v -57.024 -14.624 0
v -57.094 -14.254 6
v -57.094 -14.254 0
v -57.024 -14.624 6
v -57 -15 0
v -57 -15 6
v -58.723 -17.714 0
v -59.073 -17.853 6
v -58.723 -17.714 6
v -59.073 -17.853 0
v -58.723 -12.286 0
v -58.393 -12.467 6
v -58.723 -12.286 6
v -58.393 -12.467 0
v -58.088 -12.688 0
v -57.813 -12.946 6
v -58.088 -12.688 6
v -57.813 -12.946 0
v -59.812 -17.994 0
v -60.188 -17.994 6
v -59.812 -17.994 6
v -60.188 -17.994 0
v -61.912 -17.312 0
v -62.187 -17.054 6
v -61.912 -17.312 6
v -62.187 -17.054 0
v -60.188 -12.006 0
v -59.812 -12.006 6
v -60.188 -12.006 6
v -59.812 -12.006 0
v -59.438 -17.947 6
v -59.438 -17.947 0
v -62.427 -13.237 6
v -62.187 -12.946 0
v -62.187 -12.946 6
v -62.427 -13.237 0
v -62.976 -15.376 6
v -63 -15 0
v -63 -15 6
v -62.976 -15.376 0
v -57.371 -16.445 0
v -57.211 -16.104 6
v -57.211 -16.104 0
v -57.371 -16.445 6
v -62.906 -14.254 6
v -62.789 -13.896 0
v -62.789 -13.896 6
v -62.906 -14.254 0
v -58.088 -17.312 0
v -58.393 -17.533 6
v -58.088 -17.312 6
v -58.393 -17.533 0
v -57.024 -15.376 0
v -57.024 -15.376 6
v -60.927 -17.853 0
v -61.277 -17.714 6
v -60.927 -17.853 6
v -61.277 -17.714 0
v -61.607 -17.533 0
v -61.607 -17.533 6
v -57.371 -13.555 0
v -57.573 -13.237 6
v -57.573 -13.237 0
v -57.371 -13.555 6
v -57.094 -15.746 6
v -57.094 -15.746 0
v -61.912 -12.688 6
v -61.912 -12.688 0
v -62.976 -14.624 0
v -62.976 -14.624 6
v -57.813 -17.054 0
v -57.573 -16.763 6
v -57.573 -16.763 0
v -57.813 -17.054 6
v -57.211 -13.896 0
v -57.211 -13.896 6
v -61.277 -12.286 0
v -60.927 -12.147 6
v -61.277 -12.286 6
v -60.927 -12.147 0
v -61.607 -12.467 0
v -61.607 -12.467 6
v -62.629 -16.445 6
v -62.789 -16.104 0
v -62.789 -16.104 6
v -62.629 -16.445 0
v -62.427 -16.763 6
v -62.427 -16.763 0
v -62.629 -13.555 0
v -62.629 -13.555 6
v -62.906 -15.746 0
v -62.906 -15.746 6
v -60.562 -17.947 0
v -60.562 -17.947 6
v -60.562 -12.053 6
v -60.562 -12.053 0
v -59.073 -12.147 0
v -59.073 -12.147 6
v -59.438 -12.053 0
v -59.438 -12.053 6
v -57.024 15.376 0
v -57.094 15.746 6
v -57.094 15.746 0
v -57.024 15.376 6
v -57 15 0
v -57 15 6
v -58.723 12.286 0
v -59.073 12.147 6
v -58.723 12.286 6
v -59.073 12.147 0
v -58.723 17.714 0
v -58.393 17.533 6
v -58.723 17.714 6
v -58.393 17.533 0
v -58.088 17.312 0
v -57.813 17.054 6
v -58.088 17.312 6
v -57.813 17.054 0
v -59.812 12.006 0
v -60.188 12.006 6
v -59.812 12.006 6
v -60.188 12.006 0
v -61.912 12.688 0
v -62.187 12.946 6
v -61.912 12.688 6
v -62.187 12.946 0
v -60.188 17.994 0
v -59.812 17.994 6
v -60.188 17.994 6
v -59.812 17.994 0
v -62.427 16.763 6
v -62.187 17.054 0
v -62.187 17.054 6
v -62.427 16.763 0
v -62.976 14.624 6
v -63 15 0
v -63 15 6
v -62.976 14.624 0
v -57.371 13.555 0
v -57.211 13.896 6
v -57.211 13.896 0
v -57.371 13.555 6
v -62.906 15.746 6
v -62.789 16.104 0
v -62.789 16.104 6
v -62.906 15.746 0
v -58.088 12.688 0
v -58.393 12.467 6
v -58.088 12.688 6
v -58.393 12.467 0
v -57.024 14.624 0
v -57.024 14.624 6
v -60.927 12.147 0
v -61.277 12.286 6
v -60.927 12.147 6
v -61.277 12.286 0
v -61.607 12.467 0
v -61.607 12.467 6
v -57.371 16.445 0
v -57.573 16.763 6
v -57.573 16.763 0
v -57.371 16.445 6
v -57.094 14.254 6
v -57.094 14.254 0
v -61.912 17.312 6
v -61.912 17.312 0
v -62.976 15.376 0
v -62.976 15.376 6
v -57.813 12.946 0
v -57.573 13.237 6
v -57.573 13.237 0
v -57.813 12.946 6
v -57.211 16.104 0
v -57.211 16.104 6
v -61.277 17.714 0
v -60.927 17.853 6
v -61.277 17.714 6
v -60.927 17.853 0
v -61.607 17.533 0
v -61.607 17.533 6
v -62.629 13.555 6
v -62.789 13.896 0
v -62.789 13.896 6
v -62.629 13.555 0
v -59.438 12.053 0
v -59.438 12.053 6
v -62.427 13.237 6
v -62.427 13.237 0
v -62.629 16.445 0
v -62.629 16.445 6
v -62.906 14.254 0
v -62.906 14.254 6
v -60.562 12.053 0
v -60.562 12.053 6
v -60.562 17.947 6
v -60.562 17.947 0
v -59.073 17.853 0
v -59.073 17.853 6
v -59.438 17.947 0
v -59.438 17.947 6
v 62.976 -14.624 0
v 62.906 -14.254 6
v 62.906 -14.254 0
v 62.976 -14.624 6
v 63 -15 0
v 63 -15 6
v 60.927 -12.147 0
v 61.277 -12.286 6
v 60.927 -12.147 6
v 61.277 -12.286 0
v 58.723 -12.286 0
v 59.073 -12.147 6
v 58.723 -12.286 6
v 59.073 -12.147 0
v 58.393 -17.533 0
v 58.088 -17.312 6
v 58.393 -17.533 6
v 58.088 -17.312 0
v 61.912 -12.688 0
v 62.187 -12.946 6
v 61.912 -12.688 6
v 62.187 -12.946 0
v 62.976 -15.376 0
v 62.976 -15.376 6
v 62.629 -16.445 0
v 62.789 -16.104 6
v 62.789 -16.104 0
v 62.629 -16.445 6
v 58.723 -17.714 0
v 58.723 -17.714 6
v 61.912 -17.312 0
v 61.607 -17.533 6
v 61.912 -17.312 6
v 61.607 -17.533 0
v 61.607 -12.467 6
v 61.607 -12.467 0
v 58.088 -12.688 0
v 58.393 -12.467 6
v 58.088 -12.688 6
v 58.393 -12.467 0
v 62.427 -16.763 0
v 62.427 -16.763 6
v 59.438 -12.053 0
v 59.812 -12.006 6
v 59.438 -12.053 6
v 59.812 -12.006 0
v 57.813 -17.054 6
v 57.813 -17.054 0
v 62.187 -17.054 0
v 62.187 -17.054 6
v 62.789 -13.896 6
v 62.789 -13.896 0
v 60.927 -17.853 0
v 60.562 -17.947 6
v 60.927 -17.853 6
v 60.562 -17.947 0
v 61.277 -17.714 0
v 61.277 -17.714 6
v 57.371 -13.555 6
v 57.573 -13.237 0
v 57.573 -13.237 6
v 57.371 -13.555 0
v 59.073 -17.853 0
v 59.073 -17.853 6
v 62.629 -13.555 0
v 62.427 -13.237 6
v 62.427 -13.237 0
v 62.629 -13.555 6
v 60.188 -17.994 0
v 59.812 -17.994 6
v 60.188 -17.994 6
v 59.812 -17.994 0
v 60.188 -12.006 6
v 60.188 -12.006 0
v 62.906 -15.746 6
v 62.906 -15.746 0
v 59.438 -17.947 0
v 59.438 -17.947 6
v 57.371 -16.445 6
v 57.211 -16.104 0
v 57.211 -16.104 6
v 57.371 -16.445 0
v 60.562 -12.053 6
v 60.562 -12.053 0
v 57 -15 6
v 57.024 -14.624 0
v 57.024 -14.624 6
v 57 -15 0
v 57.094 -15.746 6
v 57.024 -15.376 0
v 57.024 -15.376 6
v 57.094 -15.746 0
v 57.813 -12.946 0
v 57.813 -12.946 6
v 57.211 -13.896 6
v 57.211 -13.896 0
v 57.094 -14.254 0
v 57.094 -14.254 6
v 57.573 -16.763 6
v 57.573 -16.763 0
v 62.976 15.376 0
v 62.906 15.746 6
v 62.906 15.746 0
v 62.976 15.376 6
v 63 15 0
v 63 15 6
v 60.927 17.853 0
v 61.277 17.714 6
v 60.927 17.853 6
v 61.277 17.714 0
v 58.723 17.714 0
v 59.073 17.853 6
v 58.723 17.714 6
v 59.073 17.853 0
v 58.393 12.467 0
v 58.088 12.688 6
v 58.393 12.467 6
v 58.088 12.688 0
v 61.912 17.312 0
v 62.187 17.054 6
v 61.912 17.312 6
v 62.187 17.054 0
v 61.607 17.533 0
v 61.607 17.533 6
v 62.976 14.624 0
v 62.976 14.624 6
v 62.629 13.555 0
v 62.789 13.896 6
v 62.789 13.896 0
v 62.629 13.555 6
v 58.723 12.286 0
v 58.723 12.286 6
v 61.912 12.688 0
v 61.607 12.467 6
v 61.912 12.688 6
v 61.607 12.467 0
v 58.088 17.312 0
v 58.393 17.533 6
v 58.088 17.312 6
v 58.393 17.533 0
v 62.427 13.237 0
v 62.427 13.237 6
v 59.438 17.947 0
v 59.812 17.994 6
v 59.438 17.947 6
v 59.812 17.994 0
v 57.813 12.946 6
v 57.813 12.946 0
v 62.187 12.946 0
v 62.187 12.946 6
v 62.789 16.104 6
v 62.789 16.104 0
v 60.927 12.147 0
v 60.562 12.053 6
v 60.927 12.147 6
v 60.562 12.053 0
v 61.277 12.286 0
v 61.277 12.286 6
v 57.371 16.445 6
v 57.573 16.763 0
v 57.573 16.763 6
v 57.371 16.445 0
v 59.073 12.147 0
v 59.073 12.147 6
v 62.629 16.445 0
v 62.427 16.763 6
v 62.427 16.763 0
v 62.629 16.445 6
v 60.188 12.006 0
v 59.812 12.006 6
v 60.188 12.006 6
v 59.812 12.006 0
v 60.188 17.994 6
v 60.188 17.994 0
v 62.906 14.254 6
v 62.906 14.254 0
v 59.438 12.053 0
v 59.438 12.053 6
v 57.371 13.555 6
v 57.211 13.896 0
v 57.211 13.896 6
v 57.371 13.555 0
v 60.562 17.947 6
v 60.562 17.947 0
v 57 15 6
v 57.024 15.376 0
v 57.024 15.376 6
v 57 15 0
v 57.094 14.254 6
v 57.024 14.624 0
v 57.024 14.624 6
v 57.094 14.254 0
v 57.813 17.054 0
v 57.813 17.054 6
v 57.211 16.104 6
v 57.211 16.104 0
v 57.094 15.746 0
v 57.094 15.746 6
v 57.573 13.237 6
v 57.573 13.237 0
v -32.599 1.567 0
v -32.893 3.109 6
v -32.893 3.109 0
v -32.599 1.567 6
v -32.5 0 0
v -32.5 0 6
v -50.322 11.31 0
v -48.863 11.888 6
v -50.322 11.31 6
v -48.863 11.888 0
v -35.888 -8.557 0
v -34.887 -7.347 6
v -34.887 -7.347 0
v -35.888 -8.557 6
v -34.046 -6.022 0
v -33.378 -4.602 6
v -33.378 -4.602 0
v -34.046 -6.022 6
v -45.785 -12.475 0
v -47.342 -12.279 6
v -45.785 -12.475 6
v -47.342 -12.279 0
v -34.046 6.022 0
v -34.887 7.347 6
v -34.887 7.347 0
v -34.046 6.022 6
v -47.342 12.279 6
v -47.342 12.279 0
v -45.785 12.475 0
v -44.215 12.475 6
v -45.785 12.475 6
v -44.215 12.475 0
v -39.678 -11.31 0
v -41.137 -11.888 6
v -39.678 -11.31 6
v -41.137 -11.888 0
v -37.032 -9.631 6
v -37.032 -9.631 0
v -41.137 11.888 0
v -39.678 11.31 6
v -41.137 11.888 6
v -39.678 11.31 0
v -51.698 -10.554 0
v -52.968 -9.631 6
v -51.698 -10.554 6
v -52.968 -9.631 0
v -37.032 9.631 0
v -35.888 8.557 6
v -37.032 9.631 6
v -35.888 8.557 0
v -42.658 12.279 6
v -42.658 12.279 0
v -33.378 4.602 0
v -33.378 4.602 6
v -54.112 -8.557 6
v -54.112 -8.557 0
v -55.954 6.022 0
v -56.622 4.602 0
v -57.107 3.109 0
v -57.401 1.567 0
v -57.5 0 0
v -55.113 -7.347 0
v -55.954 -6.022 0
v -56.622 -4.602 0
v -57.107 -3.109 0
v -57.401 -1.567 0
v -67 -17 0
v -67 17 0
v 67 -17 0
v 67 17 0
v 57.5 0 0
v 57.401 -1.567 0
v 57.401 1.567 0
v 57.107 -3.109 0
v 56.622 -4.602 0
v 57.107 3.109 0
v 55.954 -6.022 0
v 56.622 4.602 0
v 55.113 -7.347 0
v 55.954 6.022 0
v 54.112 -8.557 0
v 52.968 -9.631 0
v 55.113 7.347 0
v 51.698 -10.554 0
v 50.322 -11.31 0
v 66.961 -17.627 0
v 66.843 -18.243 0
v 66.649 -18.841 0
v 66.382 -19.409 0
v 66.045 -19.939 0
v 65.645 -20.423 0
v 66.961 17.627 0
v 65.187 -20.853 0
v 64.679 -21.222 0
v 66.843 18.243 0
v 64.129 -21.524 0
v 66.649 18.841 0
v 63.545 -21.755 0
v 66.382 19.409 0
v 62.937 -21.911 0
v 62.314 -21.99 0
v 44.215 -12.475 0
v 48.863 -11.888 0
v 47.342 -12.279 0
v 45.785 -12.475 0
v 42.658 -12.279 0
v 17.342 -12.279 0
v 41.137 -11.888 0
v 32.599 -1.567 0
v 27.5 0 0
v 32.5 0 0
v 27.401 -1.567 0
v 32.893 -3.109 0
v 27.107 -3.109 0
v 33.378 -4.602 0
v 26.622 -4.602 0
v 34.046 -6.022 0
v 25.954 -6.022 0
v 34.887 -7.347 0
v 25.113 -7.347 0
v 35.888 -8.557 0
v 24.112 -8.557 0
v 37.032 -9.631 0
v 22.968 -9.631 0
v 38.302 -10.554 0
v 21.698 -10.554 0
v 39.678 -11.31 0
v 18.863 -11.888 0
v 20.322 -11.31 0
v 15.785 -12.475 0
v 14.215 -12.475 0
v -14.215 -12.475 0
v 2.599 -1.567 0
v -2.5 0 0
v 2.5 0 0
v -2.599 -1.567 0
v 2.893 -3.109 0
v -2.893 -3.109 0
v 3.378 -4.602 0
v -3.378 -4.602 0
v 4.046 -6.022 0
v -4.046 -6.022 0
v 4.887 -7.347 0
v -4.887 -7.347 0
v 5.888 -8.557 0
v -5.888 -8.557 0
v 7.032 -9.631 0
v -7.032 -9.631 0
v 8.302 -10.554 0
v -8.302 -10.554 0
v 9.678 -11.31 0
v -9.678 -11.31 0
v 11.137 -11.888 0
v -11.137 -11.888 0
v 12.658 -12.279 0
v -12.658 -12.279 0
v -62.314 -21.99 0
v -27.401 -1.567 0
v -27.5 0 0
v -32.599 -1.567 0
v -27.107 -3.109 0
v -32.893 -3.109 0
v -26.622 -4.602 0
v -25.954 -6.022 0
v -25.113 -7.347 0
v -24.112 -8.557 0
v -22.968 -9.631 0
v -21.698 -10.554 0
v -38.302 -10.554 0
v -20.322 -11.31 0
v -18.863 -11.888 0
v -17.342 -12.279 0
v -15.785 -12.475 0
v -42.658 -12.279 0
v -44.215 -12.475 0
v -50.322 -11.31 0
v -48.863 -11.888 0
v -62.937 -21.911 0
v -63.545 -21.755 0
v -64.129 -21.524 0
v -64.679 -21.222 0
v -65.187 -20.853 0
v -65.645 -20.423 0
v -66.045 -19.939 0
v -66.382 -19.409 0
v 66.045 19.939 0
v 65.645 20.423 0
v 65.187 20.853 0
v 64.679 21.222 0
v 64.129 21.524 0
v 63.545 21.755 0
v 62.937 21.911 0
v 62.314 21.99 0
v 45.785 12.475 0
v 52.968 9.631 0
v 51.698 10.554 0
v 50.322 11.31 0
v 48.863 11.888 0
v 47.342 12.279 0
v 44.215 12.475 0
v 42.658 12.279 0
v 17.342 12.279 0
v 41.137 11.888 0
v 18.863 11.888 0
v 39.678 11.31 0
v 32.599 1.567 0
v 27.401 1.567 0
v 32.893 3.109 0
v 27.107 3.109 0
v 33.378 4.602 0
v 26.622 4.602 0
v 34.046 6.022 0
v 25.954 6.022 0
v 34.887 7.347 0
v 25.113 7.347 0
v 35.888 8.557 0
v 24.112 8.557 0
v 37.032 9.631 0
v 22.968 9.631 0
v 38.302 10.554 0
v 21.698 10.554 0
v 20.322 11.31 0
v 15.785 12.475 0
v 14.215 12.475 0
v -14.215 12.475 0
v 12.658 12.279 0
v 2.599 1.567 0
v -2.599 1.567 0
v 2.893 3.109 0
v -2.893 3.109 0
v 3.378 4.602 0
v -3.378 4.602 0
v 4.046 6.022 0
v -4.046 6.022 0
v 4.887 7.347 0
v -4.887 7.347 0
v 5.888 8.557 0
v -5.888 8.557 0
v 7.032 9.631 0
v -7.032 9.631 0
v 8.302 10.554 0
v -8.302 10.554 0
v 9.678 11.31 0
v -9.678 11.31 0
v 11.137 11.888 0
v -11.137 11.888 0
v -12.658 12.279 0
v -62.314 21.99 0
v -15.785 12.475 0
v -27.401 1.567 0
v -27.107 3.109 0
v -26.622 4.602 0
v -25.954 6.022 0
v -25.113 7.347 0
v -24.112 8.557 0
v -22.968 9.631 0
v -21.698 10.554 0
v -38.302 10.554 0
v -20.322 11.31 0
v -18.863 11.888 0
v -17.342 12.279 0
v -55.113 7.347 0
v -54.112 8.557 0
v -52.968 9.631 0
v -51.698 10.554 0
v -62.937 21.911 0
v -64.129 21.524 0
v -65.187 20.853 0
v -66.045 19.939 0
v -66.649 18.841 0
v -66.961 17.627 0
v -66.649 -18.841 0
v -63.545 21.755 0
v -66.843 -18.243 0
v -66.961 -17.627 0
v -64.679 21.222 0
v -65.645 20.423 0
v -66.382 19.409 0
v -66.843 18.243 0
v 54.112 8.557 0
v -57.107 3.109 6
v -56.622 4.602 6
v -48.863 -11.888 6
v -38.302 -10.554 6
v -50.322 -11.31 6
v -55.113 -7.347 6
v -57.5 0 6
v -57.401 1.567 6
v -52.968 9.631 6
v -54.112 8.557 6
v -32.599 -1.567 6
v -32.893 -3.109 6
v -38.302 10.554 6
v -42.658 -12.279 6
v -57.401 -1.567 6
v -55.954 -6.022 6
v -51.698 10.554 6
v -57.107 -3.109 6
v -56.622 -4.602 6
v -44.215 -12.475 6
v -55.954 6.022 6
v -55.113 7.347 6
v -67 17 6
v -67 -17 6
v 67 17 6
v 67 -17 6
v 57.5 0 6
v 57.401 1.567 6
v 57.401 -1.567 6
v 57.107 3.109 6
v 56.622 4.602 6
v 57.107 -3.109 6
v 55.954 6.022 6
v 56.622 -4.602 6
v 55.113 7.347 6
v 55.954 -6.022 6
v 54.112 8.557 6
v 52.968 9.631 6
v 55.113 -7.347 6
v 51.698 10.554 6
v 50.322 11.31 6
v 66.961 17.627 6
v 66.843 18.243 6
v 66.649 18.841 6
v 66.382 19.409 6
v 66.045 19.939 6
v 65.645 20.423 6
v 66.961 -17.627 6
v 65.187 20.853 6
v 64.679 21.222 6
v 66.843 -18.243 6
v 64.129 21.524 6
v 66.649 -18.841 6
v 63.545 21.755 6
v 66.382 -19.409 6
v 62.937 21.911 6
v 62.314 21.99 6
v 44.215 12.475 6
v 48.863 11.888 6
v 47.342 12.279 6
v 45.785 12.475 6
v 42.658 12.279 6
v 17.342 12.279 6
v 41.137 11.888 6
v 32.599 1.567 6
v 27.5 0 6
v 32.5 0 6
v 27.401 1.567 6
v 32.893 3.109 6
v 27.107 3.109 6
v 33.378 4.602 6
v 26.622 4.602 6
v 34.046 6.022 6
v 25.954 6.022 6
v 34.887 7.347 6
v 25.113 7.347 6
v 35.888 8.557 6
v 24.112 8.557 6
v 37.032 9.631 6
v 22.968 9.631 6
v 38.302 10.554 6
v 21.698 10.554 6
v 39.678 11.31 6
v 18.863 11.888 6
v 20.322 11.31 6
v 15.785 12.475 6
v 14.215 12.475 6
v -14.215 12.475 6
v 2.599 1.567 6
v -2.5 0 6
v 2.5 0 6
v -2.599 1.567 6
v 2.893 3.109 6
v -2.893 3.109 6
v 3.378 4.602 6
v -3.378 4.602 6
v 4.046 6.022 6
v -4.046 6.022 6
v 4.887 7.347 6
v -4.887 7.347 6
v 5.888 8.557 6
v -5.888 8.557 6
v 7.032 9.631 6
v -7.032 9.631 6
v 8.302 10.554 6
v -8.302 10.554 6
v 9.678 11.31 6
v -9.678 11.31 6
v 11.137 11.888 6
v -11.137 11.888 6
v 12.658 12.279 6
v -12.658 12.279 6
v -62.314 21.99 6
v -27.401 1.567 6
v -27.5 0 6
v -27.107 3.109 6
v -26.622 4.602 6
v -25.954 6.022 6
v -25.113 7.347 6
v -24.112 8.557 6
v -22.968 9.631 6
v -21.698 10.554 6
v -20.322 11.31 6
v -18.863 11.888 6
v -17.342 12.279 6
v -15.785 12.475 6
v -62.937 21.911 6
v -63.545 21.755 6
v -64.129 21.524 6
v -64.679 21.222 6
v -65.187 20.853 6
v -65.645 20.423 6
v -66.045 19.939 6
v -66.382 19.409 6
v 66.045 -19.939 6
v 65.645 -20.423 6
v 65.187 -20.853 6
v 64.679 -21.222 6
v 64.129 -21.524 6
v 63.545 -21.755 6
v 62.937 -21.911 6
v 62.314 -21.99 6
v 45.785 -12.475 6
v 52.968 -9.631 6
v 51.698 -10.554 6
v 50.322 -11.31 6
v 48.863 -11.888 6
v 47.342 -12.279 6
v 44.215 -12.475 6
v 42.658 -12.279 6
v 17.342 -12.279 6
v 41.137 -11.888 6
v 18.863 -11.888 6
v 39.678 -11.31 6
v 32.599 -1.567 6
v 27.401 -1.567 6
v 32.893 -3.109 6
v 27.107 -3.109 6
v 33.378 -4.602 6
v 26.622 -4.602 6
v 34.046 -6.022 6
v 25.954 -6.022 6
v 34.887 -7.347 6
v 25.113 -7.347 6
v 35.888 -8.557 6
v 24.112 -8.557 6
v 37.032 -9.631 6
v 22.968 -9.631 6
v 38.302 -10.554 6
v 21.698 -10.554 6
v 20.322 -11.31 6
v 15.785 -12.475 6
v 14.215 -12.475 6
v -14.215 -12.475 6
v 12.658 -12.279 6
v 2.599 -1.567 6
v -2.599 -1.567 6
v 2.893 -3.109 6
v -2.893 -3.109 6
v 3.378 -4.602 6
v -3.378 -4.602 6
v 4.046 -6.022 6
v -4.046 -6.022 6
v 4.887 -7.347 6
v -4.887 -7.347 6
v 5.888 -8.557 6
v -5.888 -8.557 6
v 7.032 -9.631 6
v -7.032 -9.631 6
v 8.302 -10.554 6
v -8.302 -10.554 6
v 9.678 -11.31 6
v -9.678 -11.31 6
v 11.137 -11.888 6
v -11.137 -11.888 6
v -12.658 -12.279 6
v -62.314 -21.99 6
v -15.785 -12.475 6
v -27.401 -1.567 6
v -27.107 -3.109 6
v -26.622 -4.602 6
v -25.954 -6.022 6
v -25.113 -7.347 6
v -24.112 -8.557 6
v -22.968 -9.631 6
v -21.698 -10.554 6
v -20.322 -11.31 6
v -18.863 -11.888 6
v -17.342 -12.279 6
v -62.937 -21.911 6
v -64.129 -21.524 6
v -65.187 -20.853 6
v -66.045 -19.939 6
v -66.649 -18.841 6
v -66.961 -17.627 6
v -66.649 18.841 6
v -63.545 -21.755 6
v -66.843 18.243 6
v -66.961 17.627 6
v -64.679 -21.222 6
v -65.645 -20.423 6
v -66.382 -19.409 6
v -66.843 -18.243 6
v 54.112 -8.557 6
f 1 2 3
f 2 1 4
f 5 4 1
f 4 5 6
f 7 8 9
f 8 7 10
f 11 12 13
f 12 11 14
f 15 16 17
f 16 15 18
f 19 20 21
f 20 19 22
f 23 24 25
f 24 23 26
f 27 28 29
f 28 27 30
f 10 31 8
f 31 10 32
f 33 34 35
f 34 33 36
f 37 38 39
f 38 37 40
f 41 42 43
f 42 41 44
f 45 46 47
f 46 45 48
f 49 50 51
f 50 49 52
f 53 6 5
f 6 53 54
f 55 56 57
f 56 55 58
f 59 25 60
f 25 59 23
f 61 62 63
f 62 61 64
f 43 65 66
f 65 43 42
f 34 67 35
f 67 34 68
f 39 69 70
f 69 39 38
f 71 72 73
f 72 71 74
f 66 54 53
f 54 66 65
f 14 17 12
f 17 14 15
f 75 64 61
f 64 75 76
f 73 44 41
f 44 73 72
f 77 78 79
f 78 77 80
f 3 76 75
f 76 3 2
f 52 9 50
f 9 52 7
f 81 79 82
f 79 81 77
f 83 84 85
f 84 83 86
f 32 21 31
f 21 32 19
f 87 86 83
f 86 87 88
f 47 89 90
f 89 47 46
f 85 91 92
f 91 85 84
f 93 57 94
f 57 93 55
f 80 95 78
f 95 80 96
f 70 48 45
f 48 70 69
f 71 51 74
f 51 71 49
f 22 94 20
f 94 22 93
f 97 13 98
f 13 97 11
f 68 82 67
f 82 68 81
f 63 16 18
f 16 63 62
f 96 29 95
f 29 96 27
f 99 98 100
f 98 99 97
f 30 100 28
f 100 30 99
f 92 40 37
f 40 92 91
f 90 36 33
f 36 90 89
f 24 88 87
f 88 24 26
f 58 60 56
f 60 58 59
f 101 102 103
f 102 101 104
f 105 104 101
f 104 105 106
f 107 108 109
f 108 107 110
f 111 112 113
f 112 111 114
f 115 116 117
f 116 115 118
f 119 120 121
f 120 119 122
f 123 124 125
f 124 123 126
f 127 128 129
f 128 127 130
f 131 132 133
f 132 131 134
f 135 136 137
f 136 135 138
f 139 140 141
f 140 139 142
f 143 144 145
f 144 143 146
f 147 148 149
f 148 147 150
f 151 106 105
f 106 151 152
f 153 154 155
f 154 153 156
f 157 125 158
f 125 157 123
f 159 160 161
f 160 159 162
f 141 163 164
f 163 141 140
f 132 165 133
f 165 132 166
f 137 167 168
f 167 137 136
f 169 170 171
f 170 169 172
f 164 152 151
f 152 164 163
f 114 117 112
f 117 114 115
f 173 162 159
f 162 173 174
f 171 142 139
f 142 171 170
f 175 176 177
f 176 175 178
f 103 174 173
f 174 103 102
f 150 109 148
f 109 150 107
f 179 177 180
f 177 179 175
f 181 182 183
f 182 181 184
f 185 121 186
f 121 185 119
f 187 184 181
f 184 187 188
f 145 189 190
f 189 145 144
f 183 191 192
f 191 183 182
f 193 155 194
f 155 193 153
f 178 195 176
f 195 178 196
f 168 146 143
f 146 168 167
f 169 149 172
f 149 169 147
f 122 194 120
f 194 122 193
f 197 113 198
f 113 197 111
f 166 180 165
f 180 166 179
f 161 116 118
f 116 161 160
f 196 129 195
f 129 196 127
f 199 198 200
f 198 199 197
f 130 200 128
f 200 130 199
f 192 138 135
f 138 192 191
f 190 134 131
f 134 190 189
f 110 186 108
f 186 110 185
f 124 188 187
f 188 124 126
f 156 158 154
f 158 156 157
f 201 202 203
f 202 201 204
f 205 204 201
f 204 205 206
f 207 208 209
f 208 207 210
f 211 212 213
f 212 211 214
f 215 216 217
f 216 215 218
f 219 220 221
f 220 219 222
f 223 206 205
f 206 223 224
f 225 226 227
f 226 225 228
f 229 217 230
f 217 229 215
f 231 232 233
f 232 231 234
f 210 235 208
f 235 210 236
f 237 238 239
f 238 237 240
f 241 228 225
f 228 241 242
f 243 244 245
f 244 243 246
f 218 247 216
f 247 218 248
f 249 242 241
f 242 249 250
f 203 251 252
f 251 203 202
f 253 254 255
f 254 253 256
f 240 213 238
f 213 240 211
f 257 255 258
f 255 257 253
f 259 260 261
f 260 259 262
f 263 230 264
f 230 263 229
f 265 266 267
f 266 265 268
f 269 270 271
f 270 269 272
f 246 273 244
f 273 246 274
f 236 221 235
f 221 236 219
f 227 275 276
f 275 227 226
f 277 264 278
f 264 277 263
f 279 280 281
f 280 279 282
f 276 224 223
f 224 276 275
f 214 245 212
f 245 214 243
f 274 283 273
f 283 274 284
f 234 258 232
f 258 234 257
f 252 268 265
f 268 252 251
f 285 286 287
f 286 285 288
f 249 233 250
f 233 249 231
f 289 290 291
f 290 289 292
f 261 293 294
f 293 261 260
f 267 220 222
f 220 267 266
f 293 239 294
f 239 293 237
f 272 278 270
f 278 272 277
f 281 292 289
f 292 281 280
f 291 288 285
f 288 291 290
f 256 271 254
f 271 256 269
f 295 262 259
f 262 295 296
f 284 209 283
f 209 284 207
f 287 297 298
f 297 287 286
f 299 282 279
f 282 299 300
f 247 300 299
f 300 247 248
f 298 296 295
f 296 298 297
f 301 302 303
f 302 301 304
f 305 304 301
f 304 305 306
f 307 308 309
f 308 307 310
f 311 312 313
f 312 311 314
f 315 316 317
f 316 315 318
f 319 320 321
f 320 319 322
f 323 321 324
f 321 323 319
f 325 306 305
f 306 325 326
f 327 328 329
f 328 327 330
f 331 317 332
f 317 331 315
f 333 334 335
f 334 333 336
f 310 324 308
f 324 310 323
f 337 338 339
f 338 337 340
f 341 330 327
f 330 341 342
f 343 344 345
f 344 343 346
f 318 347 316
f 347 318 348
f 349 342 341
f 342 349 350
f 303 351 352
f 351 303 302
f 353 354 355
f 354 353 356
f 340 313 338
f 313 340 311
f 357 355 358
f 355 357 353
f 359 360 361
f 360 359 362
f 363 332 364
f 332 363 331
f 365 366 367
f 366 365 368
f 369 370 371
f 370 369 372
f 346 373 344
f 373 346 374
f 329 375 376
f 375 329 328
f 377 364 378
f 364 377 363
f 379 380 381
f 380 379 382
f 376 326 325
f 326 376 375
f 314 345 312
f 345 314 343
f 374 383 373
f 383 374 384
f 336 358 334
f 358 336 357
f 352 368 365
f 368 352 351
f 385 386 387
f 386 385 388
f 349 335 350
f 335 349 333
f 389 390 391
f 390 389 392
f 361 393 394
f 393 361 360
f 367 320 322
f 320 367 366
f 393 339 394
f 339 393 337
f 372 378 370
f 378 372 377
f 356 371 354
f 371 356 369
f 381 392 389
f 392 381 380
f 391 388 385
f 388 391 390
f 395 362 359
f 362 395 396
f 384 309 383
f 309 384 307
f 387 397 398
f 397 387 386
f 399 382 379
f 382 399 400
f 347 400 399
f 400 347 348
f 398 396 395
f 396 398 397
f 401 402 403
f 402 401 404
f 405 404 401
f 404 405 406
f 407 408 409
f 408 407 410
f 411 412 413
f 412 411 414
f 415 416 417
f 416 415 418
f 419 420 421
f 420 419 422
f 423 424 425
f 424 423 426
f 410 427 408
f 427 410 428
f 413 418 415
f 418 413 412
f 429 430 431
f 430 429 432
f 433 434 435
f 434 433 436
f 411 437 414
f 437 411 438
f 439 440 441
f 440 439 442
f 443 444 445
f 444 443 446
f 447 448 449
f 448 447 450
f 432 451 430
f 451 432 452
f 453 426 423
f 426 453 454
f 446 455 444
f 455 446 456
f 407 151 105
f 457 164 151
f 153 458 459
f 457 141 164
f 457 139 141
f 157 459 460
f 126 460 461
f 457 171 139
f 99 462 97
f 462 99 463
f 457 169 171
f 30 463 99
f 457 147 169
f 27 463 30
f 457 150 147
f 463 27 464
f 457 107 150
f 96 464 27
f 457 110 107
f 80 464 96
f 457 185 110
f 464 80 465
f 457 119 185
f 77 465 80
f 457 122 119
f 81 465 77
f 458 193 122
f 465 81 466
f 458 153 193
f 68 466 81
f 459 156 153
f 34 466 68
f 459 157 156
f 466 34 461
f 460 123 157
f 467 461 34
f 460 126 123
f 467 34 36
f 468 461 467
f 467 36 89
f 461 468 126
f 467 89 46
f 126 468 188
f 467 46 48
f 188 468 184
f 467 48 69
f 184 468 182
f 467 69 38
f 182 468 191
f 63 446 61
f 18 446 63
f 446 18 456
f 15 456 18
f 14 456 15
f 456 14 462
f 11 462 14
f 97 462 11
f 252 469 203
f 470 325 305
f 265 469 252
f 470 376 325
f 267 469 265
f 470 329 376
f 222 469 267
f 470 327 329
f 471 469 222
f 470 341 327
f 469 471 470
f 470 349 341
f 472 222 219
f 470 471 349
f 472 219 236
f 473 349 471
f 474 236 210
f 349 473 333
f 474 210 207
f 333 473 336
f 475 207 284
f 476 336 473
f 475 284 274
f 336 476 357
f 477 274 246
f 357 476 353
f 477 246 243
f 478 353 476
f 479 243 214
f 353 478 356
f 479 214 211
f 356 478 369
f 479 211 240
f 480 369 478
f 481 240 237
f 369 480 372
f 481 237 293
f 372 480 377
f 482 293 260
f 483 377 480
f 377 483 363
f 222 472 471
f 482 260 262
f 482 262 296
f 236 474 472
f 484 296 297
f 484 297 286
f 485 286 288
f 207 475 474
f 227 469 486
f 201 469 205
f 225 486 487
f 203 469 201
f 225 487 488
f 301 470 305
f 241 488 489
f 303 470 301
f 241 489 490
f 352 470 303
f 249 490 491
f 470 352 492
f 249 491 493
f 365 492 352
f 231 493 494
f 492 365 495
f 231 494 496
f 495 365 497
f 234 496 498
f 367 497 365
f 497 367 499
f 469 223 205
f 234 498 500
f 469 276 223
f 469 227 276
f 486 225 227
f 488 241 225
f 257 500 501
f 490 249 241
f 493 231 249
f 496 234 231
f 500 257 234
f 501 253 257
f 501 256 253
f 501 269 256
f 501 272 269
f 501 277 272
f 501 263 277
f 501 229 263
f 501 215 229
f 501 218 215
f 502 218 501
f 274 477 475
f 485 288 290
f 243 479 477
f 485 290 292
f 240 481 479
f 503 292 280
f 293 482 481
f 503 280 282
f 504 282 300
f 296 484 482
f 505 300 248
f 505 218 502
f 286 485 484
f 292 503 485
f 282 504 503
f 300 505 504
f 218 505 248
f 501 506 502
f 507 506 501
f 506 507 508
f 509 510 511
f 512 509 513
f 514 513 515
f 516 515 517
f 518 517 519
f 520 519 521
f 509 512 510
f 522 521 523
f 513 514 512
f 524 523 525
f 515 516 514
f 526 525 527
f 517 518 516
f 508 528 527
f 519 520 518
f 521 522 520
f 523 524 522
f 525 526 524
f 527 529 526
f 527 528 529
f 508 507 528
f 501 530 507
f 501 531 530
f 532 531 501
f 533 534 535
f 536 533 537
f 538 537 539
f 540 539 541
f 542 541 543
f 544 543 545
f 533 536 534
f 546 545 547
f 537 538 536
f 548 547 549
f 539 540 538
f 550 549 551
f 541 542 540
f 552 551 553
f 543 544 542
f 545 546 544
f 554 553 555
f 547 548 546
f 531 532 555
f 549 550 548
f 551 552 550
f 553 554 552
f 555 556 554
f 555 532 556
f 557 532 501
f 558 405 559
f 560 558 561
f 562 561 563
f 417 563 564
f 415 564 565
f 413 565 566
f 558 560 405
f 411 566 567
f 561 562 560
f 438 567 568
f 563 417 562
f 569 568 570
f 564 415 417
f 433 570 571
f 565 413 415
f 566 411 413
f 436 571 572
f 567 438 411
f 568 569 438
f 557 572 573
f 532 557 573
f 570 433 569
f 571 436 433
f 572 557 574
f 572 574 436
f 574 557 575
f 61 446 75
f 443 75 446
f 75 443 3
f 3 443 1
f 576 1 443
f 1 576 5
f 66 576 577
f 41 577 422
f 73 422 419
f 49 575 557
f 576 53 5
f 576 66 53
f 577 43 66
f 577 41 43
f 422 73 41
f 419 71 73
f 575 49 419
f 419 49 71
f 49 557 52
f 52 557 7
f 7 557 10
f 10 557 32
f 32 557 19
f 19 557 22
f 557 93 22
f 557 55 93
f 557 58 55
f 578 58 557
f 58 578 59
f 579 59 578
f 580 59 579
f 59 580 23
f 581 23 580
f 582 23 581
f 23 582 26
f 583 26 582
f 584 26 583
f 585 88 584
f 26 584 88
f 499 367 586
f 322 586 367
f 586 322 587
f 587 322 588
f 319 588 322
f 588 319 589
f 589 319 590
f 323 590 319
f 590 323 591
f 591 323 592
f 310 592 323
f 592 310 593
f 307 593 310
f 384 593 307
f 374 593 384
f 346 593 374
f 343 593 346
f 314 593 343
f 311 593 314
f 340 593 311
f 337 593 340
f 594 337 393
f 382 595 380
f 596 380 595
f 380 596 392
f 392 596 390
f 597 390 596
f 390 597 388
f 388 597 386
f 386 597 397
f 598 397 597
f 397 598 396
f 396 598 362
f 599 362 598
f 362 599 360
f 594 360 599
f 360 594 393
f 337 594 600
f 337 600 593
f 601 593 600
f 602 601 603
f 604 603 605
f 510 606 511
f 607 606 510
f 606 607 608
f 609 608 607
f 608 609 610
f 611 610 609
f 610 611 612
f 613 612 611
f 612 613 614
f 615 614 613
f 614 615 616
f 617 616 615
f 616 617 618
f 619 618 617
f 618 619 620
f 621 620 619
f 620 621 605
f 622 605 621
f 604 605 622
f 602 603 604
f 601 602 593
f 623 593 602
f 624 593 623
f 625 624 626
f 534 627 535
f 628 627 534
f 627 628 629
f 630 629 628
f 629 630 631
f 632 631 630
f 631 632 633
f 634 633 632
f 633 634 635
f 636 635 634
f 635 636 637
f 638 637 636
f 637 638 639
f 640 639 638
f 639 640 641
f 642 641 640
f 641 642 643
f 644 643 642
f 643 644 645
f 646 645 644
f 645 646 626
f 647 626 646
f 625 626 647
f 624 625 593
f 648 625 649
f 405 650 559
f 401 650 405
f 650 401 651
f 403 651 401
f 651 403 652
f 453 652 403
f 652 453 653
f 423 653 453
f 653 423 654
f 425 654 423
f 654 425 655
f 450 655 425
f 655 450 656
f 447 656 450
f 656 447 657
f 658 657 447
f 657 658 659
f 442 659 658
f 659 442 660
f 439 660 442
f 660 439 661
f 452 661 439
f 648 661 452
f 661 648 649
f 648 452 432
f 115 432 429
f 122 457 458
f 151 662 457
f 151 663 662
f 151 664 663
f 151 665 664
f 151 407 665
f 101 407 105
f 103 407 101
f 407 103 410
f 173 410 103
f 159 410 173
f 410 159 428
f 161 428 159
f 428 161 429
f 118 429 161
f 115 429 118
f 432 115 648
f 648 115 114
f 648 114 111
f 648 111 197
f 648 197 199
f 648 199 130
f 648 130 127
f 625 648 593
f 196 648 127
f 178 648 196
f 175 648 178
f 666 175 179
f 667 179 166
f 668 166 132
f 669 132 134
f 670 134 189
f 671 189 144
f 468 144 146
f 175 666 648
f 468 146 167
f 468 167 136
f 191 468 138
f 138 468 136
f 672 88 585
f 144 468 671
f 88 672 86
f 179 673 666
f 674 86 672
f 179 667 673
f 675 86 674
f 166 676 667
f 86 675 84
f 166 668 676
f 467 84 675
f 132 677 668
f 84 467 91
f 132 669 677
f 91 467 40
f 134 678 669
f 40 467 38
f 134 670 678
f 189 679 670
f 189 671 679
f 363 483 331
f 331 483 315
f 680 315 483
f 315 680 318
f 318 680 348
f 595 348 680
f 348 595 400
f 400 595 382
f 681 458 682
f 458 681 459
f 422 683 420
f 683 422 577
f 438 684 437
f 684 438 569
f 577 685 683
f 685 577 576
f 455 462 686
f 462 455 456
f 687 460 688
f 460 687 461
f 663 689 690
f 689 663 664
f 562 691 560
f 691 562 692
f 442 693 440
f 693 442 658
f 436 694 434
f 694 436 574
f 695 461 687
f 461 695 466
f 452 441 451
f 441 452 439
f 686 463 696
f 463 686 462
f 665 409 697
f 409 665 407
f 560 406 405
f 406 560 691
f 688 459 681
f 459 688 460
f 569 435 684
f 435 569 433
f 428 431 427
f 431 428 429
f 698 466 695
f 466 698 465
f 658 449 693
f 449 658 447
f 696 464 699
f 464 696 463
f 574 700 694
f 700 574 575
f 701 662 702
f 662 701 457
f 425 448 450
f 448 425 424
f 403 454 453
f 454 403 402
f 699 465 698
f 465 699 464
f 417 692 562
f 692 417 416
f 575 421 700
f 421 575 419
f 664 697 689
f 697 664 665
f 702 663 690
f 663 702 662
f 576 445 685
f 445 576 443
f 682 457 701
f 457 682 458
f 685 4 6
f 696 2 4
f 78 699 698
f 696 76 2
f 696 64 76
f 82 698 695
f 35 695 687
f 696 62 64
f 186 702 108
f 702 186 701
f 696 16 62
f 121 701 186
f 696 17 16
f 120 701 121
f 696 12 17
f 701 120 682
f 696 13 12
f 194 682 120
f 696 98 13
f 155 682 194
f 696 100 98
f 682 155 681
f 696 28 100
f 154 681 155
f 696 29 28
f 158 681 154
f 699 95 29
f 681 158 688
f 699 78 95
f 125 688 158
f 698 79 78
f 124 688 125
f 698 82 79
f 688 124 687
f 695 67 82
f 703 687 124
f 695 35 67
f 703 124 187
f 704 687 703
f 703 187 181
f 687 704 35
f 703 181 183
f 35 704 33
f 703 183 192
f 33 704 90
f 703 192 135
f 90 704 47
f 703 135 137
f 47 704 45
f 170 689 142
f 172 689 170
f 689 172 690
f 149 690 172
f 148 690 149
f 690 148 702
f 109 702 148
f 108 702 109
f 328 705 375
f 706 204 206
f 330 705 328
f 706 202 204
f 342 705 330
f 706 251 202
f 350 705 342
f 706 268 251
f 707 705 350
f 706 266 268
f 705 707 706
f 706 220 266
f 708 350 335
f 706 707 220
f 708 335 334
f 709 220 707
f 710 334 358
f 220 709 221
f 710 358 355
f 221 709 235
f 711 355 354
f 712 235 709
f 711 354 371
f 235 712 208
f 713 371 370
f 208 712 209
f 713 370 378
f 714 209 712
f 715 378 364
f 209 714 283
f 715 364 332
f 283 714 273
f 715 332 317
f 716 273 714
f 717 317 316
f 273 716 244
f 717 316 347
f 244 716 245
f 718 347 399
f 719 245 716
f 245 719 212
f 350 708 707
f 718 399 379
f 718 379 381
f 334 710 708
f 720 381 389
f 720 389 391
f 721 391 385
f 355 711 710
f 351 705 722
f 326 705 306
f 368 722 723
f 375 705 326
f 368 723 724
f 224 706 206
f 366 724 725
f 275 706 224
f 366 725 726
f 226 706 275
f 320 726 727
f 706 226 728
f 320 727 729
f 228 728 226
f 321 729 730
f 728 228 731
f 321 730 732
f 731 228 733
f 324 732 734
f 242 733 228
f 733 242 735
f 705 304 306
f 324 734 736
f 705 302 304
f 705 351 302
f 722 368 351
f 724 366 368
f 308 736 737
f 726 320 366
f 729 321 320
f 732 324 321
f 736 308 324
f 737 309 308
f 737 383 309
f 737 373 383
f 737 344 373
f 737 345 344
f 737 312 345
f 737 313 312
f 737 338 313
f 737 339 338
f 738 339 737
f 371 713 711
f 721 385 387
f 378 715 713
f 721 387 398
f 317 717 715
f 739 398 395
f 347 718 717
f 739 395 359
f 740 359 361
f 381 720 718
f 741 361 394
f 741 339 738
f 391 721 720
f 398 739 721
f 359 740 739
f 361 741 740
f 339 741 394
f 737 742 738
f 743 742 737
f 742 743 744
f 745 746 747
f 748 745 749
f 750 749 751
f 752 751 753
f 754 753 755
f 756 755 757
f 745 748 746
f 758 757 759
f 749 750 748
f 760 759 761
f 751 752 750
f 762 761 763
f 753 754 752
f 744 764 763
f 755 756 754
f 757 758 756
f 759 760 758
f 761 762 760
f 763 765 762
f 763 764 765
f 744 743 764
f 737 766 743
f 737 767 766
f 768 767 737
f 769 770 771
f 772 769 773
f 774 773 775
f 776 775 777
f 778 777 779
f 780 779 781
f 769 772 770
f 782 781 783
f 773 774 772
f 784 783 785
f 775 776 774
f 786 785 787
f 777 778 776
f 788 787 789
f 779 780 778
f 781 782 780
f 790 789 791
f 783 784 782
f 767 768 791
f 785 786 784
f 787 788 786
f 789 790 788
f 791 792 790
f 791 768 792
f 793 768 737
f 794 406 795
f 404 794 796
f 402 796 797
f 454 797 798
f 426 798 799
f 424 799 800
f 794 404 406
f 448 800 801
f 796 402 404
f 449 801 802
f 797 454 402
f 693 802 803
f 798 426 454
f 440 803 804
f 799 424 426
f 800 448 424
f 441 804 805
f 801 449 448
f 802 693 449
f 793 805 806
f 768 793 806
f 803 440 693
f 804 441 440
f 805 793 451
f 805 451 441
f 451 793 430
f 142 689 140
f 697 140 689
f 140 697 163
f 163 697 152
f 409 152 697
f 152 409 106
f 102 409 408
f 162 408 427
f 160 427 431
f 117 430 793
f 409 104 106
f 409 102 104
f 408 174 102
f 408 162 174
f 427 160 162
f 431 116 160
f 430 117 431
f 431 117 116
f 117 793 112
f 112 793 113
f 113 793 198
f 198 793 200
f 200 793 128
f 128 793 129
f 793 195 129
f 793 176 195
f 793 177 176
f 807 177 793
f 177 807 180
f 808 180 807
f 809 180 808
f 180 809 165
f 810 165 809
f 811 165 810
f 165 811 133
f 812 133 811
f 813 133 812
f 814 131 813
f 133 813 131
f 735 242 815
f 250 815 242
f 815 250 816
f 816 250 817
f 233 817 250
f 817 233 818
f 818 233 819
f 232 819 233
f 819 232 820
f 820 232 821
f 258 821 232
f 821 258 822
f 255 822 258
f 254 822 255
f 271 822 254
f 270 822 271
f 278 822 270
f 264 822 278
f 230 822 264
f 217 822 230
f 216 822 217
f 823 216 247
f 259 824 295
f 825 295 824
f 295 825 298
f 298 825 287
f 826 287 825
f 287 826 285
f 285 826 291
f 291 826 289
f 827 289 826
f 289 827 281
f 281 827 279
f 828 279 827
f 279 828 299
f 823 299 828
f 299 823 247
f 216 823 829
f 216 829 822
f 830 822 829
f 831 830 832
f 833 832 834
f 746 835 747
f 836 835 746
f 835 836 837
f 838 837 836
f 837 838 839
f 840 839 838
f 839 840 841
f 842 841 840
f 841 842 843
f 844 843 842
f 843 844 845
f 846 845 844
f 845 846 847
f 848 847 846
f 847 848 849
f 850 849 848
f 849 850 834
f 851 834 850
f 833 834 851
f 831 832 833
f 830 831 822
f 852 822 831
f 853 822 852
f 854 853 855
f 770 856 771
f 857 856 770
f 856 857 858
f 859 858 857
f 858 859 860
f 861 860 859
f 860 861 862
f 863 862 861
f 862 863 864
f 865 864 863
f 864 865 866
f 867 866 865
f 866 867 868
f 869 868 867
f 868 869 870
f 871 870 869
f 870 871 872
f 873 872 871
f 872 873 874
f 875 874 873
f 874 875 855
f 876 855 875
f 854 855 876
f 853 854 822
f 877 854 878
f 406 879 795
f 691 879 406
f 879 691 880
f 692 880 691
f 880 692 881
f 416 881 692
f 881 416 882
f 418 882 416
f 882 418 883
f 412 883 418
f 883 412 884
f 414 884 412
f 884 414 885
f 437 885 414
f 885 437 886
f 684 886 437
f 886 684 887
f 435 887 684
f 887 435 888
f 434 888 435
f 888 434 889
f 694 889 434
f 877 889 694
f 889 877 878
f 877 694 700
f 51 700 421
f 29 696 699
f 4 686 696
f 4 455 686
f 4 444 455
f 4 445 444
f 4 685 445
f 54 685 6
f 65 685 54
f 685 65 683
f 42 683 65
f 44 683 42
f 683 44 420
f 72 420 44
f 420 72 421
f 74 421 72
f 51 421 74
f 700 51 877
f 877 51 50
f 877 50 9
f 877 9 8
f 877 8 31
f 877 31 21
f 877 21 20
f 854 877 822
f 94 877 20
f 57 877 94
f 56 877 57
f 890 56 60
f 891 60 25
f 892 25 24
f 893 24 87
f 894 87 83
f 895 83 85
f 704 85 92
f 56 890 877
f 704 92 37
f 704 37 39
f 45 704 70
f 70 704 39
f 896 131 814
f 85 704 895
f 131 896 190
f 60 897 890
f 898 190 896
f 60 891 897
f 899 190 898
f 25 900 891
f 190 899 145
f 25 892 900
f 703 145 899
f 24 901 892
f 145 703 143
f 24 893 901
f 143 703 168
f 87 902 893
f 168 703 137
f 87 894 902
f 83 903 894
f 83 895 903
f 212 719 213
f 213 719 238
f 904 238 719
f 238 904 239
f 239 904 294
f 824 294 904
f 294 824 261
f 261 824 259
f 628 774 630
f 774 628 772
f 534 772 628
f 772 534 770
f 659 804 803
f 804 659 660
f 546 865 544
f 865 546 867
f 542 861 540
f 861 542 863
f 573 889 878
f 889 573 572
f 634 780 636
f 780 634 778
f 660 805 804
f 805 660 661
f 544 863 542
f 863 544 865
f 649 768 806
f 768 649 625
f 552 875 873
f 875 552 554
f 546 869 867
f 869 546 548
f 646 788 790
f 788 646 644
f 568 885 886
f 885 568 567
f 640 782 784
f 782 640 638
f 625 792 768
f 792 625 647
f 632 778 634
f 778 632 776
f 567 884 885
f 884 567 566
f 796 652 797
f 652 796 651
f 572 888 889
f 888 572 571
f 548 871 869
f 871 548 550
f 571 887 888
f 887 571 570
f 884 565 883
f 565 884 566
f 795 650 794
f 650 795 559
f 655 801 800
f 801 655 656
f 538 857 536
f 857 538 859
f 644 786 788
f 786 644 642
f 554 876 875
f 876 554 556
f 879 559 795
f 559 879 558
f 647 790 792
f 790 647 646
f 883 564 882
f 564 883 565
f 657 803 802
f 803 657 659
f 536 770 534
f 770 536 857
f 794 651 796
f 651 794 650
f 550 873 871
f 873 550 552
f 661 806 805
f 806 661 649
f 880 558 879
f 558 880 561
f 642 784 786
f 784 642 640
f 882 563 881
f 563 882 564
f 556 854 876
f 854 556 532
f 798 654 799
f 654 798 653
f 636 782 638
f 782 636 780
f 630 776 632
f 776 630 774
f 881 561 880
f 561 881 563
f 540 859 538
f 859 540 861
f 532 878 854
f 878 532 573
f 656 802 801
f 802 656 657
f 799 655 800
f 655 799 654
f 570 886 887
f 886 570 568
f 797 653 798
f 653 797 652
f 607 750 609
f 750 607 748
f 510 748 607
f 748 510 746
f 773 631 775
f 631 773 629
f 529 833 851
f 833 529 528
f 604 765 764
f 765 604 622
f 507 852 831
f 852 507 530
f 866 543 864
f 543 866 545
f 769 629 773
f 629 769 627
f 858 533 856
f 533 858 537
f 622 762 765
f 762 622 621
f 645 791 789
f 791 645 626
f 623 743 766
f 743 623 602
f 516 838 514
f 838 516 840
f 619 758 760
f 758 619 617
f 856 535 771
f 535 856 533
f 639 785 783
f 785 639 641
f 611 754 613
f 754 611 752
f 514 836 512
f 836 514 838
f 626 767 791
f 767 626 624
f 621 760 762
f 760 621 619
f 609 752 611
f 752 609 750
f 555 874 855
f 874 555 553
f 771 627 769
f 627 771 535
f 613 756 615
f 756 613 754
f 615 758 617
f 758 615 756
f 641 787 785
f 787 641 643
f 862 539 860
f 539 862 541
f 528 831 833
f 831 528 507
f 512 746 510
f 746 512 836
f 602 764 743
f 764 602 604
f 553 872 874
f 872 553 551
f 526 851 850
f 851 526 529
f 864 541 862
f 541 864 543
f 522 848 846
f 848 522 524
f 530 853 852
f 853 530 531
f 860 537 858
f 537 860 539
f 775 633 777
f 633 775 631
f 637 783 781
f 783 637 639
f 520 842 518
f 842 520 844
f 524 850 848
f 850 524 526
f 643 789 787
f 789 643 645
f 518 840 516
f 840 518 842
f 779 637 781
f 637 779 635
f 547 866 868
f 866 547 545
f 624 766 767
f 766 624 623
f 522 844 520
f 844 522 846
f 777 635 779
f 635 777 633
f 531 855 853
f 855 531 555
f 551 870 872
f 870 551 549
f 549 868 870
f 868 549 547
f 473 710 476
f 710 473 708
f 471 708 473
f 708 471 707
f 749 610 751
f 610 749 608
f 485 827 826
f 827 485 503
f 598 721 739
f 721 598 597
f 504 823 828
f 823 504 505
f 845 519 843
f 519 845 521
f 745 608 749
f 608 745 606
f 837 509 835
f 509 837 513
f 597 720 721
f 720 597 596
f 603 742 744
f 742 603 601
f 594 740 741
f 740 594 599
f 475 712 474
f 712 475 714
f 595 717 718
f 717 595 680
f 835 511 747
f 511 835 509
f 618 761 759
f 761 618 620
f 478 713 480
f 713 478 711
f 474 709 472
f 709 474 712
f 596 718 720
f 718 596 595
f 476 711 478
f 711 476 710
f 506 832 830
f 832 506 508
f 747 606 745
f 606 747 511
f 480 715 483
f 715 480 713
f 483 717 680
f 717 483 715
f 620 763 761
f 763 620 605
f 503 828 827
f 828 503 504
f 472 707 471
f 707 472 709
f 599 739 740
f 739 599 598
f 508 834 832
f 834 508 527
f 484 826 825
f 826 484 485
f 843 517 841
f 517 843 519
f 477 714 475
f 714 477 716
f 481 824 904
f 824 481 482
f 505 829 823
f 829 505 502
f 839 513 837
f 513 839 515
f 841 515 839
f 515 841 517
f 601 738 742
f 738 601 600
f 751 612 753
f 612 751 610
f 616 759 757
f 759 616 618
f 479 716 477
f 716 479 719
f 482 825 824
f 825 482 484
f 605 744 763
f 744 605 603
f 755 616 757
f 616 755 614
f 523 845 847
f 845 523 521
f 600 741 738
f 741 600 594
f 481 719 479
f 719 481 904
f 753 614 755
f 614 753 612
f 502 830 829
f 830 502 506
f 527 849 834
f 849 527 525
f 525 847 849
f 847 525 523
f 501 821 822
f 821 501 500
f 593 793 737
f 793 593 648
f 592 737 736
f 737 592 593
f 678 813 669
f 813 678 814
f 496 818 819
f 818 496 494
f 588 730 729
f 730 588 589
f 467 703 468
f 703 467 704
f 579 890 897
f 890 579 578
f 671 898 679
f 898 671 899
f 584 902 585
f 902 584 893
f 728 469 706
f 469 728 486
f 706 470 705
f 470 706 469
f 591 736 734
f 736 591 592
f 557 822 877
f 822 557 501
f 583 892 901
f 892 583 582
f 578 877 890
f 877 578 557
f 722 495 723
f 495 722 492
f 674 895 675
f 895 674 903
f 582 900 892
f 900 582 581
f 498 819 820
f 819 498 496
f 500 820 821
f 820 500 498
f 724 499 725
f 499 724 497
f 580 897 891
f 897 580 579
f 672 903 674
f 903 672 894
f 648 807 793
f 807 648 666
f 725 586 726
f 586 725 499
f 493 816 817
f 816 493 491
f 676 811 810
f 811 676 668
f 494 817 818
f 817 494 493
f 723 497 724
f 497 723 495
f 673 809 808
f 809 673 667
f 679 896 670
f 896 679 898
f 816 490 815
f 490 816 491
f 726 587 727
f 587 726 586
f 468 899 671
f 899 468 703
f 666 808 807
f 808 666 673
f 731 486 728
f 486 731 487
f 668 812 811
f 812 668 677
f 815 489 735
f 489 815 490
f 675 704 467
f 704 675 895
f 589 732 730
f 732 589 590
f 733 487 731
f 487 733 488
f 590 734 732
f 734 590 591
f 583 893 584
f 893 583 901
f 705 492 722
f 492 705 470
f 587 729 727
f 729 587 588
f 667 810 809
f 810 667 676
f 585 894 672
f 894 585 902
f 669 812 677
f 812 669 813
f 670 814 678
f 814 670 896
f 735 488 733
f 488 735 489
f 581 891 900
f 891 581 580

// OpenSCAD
$fn = 50;


difference() {
	union() {
		hull() {
			translate(v = [-62.0000000000, 17.0000000000, 0]) {
				cylinder(h = 6, r = 5);
			}
			translate(v = [62.0000000000, 17.0000000000, 0]) {
				cylinder(h = 6, r = 5);
			}
			translate(v = [-62.0000000000, -17.0000000000, 0]) {
				cylinder(h = 6, r = 5);
			}
			translate(v = [62.0000000000, -17.0000000000, 0]) {
				cylinder(h = 6, r = 5);
			}
		}
	}
	union() {
		#translate(v = [-60.0000000000, -15.0000000000, -100.0000000000]) {
			cylinder(h = 200, r = 3.0000000000);
		}
		#translate(v = [-60.0000000000, 15.0000000000, -100.0000000000]) {
			cylinder(h = 200, r = 3.0000000000);
		}
		#translate(v = [60.0000000000, -15.0000000000, -100.0000000000]) {
			cylinder(h = 200, r = 3.0000000000);
		}
		#translate(v = [60.0000000000, 15.0000000000, -100.0000000000]) {
			cylinder(h = 200, r = 3.0000000000);
		}
		#translate(v = [-45.0000000000, 0, 0]) {
			cylinder(h = 6, r = 12.5000000000);
		}
		#translate(v = [-15.0000000000, 0, 0]) {
			cylinder(h = 6, r = 12.5000000000);
		}
		#translate(v = [15.0000000000, 0, 0]) {
			cylinder(h = 6, r = 12.5000000000);
		}
		#translate(v = [45.0000000000, 0, 0]) {
			cylinder(h = 6, r = 12.5000000000);
		}
	}
}
